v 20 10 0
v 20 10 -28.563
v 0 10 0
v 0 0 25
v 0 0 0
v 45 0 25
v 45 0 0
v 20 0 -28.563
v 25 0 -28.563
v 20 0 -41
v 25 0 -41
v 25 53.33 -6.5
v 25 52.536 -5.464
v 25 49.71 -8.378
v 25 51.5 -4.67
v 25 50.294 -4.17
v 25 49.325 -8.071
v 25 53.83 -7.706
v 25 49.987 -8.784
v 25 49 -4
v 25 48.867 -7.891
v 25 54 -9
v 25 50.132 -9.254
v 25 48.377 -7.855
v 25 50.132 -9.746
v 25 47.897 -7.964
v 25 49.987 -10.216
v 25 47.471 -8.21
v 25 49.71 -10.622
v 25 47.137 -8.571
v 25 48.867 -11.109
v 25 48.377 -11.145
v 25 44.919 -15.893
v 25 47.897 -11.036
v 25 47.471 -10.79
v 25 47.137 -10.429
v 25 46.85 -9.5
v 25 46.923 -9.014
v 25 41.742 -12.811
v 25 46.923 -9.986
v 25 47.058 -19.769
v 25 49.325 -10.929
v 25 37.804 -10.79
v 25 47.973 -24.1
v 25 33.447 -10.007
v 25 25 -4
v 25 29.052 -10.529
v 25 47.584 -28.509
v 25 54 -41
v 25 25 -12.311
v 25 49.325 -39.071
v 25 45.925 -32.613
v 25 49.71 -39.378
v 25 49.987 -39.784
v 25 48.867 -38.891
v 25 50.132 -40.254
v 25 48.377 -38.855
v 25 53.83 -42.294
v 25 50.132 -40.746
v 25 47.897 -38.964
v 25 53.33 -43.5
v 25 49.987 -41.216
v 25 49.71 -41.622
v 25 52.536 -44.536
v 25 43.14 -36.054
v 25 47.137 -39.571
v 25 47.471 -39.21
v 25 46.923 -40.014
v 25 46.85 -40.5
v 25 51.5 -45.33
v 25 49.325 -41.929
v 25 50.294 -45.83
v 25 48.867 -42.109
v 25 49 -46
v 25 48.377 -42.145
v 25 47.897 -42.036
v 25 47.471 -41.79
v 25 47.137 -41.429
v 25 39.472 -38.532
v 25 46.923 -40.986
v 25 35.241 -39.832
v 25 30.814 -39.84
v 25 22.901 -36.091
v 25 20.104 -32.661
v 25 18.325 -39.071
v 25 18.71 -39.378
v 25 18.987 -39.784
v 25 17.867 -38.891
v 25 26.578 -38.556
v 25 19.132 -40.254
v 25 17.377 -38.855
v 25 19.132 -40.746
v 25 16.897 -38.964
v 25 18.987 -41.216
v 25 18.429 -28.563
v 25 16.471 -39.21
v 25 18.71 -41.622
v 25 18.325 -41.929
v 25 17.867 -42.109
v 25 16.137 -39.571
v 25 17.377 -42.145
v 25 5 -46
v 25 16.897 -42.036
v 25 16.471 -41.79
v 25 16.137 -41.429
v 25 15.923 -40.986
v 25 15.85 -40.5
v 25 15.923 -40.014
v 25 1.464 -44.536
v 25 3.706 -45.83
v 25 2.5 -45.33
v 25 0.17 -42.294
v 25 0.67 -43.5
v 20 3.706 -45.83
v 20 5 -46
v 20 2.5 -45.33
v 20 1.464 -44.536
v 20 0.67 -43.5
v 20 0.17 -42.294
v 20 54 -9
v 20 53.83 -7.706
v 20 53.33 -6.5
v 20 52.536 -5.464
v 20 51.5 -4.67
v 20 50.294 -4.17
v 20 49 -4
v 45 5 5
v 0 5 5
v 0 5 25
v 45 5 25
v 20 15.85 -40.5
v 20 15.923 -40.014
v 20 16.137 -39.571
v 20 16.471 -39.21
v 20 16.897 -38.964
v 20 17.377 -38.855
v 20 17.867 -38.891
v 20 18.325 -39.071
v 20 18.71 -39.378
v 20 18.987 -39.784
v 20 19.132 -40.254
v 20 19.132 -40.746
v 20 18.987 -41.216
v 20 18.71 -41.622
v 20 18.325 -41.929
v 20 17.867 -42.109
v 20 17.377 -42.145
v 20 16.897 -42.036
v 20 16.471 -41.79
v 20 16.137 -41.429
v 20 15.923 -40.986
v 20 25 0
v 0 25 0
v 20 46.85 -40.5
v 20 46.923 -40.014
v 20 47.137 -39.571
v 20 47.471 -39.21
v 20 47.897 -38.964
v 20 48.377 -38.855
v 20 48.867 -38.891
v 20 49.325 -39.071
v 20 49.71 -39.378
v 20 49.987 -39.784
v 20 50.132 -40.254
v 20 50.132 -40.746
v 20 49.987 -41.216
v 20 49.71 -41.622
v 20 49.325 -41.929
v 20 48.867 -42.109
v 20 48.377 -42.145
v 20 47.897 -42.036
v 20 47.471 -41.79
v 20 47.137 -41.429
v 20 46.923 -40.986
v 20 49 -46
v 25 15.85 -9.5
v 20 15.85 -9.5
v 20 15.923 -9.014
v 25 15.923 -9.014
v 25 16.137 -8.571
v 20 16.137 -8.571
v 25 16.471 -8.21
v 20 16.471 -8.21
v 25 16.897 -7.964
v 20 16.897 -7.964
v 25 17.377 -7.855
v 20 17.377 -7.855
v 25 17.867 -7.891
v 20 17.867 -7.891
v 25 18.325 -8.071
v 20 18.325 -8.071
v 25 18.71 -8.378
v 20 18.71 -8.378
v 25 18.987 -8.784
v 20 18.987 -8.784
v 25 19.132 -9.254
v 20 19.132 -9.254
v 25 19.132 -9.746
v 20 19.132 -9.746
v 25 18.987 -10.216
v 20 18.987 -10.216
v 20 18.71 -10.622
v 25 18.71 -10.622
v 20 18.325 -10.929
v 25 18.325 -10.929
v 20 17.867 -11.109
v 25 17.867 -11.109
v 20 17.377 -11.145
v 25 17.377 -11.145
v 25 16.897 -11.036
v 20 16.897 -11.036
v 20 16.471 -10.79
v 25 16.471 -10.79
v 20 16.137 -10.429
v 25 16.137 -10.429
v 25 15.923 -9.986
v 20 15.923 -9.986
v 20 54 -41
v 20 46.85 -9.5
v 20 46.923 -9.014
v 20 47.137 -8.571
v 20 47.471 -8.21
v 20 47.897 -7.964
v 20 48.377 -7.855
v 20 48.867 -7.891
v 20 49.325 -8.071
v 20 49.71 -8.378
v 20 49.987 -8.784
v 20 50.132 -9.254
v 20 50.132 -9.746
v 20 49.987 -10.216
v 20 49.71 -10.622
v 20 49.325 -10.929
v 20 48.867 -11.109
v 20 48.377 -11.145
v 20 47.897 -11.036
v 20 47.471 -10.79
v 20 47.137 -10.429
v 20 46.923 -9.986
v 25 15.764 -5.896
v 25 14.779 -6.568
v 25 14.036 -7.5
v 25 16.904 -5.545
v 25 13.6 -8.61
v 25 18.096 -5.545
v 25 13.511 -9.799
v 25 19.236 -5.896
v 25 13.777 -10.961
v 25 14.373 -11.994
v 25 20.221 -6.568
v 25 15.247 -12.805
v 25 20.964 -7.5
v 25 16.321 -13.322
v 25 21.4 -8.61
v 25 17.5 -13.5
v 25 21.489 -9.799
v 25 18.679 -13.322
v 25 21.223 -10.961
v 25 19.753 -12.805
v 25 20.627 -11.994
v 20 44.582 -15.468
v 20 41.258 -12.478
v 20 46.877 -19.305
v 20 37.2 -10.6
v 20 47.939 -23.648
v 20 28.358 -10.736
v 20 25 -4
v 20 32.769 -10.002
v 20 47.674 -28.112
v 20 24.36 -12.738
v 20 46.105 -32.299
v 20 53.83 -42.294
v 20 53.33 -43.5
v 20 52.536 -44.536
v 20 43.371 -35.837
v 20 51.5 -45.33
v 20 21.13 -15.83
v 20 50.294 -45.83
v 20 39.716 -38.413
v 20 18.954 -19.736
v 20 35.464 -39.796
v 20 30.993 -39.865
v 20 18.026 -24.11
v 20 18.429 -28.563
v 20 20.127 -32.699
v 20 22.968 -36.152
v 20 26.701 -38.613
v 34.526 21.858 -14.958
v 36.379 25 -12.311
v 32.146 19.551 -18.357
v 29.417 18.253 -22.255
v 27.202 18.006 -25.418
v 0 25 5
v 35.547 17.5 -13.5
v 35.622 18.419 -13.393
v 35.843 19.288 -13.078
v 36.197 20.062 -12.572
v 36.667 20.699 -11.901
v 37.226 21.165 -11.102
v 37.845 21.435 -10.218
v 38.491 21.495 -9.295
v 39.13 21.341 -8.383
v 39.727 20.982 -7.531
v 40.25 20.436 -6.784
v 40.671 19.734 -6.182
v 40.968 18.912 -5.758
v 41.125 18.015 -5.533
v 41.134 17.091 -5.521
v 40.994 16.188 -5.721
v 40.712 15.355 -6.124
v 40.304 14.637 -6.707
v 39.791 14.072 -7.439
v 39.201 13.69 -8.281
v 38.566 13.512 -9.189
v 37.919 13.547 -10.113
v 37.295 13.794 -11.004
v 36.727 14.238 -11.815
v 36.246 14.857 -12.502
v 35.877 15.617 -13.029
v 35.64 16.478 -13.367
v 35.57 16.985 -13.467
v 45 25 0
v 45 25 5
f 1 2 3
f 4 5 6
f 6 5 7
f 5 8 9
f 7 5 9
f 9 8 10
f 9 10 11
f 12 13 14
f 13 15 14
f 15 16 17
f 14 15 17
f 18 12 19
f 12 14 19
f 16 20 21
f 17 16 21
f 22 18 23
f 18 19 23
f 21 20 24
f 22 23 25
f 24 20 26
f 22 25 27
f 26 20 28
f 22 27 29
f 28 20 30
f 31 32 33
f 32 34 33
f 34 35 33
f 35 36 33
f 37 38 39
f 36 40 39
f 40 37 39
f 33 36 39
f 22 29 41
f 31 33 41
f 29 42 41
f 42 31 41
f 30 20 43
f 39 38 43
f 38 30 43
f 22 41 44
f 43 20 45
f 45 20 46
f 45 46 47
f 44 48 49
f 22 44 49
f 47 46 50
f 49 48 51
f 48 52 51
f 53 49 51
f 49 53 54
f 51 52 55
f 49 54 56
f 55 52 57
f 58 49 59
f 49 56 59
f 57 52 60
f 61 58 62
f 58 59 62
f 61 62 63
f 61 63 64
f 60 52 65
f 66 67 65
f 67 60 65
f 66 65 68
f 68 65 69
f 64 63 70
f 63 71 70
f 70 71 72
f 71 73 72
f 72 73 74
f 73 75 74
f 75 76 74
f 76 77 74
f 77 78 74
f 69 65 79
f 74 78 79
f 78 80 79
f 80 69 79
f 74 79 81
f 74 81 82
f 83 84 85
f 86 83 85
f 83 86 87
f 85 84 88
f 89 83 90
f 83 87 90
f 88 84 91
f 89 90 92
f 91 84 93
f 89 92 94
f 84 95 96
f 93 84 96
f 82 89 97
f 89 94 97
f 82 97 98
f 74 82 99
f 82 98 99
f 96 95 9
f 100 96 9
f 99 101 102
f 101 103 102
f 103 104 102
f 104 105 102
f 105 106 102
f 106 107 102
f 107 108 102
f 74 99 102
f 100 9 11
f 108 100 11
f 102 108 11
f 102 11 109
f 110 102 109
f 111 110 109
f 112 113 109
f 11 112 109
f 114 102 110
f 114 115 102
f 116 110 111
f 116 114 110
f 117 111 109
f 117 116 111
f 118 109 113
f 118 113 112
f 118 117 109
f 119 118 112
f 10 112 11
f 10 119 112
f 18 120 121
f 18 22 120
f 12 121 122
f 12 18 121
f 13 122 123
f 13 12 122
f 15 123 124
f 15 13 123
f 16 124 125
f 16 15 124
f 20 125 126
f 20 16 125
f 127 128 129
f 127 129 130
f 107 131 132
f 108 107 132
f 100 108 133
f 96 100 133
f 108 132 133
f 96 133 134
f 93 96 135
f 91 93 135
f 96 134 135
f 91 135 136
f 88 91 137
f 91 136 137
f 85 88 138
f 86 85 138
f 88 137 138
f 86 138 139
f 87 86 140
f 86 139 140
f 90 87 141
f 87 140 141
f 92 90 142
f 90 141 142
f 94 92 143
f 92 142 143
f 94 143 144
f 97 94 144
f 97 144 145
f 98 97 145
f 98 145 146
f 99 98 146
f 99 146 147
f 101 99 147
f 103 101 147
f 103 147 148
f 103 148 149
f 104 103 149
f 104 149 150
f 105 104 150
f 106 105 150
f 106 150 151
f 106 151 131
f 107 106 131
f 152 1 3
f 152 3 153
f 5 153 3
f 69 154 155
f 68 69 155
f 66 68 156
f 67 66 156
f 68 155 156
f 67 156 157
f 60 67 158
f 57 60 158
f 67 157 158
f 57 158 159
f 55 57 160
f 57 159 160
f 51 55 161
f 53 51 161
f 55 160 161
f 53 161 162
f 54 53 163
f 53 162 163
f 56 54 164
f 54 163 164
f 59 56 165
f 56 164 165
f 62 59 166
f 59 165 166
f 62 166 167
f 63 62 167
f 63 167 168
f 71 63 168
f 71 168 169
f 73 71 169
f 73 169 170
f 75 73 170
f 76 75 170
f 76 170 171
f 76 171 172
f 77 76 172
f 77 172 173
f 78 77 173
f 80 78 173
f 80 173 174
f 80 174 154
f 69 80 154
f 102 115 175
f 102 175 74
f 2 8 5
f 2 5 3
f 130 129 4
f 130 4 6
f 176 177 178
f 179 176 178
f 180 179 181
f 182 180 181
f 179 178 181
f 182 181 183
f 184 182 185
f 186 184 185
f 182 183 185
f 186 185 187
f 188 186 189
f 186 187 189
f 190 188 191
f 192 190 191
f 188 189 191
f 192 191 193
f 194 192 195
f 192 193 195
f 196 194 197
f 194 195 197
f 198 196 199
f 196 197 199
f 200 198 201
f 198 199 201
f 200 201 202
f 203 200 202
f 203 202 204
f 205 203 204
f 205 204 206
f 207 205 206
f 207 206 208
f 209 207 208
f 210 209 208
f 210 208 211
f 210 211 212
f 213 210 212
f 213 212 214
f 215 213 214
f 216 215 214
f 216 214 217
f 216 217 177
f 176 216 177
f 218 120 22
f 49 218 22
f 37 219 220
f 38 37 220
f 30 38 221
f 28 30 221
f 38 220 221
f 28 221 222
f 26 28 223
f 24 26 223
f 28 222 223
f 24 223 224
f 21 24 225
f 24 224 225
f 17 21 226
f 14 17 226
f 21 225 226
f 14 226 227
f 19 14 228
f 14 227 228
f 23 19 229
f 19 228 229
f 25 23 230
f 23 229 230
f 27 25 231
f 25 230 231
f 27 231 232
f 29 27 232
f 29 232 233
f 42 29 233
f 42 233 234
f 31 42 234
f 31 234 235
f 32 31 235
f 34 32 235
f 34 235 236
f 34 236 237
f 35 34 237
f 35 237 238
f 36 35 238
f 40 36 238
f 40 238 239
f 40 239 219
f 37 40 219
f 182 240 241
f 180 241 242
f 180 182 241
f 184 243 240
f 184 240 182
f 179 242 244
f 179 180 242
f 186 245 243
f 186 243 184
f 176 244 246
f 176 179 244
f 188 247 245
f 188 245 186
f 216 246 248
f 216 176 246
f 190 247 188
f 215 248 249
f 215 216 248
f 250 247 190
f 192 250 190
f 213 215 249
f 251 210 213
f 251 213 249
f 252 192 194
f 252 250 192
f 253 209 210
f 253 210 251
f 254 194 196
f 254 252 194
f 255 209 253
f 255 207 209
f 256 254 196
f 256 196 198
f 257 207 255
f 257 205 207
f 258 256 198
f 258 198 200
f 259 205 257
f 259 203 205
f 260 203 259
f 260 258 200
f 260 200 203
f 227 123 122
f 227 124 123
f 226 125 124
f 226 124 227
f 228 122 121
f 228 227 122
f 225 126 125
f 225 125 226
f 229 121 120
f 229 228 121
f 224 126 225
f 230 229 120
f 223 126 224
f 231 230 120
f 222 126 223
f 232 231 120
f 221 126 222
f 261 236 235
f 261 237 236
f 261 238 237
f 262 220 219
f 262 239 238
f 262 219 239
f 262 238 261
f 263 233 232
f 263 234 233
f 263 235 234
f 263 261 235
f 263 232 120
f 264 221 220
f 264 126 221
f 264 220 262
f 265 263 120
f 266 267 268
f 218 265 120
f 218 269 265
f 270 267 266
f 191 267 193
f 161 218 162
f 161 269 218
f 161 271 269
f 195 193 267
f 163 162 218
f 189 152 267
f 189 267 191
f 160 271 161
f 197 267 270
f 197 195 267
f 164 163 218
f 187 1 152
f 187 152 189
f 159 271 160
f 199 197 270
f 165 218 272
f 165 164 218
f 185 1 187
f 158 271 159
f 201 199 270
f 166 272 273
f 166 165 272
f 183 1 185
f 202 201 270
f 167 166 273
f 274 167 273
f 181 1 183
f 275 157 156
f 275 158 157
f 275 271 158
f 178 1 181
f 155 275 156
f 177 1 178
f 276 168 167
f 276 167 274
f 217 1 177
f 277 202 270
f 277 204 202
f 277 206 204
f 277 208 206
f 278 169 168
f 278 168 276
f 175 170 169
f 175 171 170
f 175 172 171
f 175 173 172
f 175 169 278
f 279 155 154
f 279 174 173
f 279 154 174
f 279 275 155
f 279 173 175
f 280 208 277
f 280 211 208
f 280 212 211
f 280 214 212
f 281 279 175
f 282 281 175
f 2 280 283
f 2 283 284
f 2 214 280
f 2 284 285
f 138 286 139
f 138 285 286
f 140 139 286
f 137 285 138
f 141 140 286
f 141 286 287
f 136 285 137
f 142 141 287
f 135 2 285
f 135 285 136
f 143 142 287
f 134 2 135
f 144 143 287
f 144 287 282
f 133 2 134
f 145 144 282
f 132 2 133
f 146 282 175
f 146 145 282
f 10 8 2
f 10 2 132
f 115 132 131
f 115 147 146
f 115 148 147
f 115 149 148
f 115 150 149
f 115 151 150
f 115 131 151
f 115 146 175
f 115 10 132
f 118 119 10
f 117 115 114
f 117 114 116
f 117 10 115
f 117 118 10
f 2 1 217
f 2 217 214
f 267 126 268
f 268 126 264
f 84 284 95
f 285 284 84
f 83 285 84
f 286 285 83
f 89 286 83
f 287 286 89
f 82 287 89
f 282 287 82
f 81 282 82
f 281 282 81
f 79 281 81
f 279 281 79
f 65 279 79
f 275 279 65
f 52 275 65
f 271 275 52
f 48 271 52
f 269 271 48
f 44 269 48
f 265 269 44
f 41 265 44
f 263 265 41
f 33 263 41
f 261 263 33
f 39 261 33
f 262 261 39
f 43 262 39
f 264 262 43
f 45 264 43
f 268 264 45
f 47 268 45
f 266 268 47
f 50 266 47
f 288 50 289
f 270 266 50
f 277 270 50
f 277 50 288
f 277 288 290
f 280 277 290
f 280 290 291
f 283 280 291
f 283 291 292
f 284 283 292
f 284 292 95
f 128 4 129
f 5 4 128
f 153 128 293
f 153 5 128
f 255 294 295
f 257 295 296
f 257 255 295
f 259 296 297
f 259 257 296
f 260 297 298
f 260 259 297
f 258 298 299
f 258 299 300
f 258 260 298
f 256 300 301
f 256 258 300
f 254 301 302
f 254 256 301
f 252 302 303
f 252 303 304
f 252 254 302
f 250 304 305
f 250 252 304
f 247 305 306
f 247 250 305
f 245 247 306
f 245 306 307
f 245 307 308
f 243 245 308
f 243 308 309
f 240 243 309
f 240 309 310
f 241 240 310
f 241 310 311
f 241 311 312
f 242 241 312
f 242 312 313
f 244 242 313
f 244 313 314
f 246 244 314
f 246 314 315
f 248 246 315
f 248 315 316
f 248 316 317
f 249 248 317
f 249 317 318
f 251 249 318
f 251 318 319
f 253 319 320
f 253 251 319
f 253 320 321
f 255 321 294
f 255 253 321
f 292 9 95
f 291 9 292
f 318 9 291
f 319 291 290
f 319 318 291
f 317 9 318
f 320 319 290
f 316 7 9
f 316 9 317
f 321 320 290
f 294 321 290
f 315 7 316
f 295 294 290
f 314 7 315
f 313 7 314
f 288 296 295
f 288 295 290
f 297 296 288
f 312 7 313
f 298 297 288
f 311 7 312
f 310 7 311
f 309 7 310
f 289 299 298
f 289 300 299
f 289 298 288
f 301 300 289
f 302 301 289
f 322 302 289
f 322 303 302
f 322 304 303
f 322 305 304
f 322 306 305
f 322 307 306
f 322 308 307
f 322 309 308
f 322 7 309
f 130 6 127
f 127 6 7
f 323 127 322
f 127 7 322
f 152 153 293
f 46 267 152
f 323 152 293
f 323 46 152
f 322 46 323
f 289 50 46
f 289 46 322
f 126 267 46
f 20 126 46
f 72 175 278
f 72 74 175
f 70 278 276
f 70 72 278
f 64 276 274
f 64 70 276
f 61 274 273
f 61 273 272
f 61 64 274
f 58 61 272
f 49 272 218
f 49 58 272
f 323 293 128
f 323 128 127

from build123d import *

# Parameters (mm, degrees)
SKETCH1_W               = 45
SKETCH1_H               = 25
BOSS_EXTRUDE1_DEPTH     = 5
SKETCH2_W               = 5
SKETCH2_H               = 25
BOSS_EXTRUDE2_DEPTH     = 46
SKETCH3_W               = 45
SKETCH3_H               = 5
BOSS_EXTRUDE3_DEPTH     = 20
CHAMFER2_SIZE2          = 20
CHAMFER2_SIZE           = 28.562960135
CHAMFER3_SIZE2          = 20
CHAMFER3_SIZE           = 28.562960135
SKETCH4_W               = 5
SKETCH4_H               = 42
BOSS_EXTRUDE4_DEPTH     = 29
CUT_EXTRUDE1_DEPTH      = 76.213030786
CUT_EXTRUDE1_DEPTH_BACK = 76.213030786
SKETCH6_R               = 15
SKETCH7_W               = 46
SKETCH7_H               = 44
CUT_EXTRUDE2_DEPTH      = 76.213030786
SKETCH8_R               = 1.65
CUT_EXTRUDE3_DEPTH      = 76.213030786
SKETCH9_R               = 4
CUT_EXTRUDE4_DEPTH      = 76.213030786
FILLET1_R               = 5


with BuildPart() as part:
    # Sketch1 → Boss-Extrude1 (new body)
    with BuildSketch(Plane.XY):
        with Locations((22.5, 12.5)):
            Rectangle(SKETCH1_W, SKETCH1_H)
    extrude(amount=BOSS_EXTRUDE1_DEPTH)

    # Sketch2 → Boss-Extrude2 (add)
    with BuildSketch(Plane(origin=(0, 0, 0), x_dir=(-1, 0, 0), z_dir=(0, 0, -1))):
        with Locations((-22.5, 12.5)):
            Rectangle(SKETCH2_W, SKETCH2_H)
    extrude(amount=BOSS_EXTRUDE2_DEPTH)

    # Sketch3 → Boss-Extrude3 (add)
    with BuildSketch(Plane.XY.offset(5)):
        with Locations((22.5, 2.5)):
            Rectangle(SKETCH3_W, SKETCH3_H)
    extrude(amount=BOSS_EXTRUDE3_DEPTH)

    # Chamfer2
    chamfer2_edges = [part.edges().sort_by_distance(p)[0] for p in [
        (25, 12.5, 0),
    ]]
    chamfer2_side = [part.faces().sort_by_distance(p)[0] for p in [
        (25, 12.5, -0.4),
    ]]
    chamfer(chamfer2_edges, length=CHAMFER2_SIZE - 0.0001, length2=CHAMFER2_SIZE2 - 0.0001, reference=chamfer2_side[0])  # a hair under: the kernel refuses the full size

    # Chamfer3
    chamfer3_edges = [part.edges().sort_by_distance(p)[0] for p in [
        (20, 12.5, 0),
    ]]
    chamfer3_side = [part.faces().sort_by_distance(p)[0] for p in [
        (20, 12.5, -0.4),
    ]]
    chamfer(chamfer3_edges, length=CHAMFER3_SIZE - 0.0001, length2=CHAMFER3_SIZE2 - 0.0001, reference=chamfer3_side[0])  # a hair under: the kernel refuses the full size

    # Sketch4 → Boss-Extrude4 (add)
    with BuildSketch(Plane(origin=(0, 25, 0), x_dir=(1, 0, 0), z_dir=(0, 1, 0))):
        with Locations((22.5, 25)):
            Rectangle(SKETCH4_W, SKETCH4_H)
    extrude(amount=BOSS_EXTRUDE4_DEPTH)

    # Sketch6 → Cut-Extrude1 (cut, two sides: drawn at the far end of the back side and taken through both)
    with BuildSketch(Plane(origin=(25, 0, 0), x_dir=(0, 0, -1), z_dir=(1, 0, 0)).offset(-CUT_EXTRUDE1_DEPTH_BACK)):
        with Locations(Location((25, 33, 0), (0, 0, 283.740844537))):
            Circle(SKETCH6_R)
    extrude(amount=CUT_EXTRUDE1_DEPTH + CUT_EXTRUDE1_DEPTH_BACK, mode=Mode.SUBTRACT)

    # Sketch7 → Cut-Extrude2 (cut, through all)
    with BuildSketch(Plane.ZY.offset(-20)):
        with Locations((-23, 32)):
            Rectangle(SKETCH7_W, SKETCH7_H)
    extrude(amount=CUT_EXTRUDE2_DEPTH, mode=Mode.SUBTRACT)

    # Sketch8 → Cut-Extrude3 (cut, through all)
    with BuildSketch(Plane.ZY.offset(-20)):
        with Locations(Location((-40.5, 48.5, 0), (0, 0, 270))):
            Circle(SKETCH8_R)
        with Locations(Location((-9.5, 48.5, 0), (0, 0, 270))):
            Circle(SKETCH8_R)
        with Locations(Location((-9.5, 17.5, 0), (0, 0, 270))):
            Circle(SKETCH8_R)
        with Locations(Location((-40.5, 17.5, 0), (0, 0, 270))):
            Circle(SKETCH8_R)
    extrude(amount=-CUT_EXTRUDE3_DEPTH, mode=Mode.SUBTRACT)

    # Sketch9 → Cut-Extrude4 (cut, through all)
    with BuildSketch(Plane(origin=(25, 0, 0), x_dir=(0, 0, -1), z_dir=(1, 0, 0))):
        with Locations((9.5, 17.5)):
            Circle(SKETCH9_R)
    extrude(amount=CUT_EXTRUDE4_DEPTH, mode=Mode.SUBTRACT)

    # Fillet1
    fillet1_edges = [part.edges().sort_by_distance(p)[0] for p in [
        (22.5, 0, -46),
        (22.5, 54, -4),
        (22.5, 54, -46),
    ]]
    fillet(fillet1_edges, radius=FILLET1_R)


solid = part.part
